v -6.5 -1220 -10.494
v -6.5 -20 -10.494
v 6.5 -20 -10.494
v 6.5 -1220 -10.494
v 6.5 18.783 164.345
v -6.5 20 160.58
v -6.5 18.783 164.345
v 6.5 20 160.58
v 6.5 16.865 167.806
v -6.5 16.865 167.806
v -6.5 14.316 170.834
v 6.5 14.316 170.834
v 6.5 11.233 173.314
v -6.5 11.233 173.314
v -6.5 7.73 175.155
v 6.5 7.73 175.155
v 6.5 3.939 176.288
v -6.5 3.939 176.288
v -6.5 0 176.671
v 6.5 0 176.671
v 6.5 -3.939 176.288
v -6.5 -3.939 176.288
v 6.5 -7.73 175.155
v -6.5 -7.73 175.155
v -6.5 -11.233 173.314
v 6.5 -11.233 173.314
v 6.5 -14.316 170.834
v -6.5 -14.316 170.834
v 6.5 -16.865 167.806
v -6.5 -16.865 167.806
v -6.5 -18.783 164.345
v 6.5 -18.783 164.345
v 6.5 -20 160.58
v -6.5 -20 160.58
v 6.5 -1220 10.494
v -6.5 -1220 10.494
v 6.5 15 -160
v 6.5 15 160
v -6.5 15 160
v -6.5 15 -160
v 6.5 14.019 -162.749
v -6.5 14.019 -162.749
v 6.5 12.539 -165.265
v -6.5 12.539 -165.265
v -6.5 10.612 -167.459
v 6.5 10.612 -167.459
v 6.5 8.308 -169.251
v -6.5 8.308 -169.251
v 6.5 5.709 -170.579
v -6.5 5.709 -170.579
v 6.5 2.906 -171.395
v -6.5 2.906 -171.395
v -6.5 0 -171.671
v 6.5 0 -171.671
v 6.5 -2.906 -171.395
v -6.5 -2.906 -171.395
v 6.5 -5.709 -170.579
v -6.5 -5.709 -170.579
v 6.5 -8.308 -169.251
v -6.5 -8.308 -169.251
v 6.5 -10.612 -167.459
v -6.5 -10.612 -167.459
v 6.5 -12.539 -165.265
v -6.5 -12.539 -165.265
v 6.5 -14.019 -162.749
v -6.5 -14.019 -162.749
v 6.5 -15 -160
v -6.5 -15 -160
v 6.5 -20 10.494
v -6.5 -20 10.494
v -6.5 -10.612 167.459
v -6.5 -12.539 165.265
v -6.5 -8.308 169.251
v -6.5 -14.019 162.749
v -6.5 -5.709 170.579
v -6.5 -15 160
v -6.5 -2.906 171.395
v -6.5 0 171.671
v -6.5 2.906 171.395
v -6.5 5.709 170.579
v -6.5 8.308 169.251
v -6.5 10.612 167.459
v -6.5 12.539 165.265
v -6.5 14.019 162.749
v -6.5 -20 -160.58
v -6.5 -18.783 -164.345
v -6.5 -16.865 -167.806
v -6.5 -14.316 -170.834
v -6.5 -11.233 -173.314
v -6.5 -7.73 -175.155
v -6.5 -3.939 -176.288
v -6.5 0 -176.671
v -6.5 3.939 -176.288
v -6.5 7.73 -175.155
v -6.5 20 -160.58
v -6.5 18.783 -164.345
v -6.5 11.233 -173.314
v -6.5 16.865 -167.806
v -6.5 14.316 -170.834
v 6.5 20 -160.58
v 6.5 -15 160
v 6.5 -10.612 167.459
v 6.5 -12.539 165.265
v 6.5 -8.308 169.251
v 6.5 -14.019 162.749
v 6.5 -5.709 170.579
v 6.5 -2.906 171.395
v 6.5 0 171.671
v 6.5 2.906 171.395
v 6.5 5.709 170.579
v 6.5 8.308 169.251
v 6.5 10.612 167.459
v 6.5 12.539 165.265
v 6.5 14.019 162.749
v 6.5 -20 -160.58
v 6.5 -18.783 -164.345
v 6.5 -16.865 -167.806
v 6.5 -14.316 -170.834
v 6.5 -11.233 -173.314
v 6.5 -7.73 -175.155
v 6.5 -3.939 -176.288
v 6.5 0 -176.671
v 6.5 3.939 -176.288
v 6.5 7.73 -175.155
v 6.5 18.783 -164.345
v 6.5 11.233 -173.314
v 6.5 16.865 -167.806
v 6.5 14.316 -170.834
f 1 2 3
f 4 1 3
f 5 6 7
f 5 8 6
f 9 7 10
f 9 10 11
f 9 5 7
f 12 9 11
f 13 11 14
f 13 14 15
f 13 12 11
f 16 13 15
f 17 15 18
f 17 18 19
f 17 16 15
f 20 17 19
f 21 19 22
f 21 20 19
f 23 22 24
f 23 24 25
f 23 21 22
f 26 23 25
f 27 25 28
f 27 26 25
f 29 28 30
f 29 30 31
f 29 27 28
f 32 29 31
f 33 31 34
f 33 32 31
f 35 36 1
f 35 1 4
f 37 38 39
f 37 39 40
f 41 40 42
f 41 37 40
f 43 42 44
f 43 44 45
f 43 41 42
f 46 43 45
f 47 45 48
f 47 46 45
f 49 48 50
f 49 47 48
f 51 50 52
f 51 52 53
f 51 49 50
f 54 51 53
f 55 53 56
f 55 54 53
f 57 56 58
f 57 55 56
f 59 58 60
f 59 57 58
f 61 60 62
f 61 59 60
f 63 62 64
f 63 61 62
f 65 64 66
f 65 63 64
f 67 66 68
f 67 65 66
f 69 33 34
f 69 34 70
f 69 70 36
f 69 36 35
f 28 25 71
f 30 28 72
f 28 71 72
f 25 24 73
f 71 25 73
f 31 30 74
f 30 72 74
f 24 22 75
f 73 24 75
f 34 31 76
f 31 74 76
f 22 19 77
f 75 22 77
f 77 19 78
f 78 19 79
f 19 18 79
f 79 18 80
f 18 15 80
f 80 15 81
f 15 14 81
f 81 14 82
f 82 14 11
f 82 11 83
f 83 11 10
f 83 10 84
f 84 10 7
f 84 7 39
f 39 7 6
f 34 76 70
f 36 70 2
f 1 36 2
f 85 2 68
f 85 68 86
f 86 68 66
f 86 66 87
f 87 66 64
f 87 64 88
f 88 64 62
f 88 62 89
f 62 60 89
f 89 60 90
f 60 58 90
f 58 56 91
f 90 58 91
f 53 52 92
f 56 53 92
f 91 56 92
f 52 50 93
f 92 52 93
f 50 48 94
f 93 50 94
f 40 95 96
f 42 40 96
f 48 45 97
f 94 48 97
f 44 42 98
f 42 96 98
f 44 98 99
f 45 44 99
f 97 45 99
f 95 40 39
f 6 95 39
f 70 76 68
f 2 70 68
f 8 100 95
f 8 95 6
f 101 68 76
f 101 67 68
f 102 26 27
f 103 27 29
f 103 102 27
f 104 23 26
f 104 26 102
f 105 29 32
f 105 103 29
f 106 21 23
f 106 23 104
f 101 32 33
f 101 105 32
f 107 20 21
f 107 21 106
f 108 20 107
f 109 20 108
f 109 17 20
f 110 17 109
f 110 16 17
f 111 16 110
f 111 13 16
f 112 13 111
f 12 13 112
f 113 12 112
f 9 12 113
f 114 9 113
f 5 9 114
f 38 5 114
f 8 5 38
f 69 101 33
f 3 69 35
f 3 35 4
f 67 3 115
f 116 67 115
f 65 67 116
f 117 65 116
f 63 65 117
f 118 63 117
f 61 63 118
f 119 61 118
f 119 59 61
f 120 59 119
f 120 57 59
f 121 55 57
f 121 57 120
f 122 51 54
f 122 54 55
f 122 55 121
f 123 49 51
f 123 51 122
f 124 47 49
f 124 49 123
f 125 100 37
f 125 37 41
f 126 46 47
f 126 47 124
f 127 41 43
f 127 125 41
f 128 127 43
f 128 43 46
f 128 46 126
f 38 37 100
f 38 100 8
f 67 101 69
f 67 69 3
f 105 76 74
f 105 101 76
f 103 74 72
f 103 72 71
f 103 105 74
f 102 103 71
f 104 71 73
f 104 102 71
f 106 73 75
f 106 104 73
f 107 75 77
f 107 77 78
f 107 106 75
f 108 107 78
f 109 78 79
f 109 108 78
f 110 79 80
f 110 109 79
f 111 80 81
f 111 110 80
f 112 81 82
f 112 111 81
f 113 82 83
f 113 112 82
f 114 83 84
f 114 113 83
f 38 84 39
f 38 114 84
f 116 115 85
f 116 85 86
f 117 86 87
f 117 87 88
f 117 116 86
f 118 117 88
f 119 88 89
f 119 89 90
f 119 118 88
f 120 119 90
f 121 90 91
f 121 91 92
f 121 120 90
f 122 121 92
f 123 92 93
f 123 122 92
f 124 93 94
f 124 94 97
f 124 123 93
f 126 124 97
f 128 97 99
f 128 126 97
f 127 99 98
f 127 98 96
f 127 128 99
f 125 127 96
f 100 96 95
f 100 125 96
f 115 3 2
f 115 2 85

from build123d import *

# Parameters (mm, degrees)
BOSS_EXTRUDE1_DEPTH = 6.5
SKETCH3_W           = 13
SKETCH3_H           = 20.987716218
BOSS_EXTRUDE2_DEPTH = 1200


with BuildPart() as part:
    # Sketch1 → Boss-Extrude1 (new, symmetric)
    with BuildSketch(Plane(origin=(0, 0, 0), x_dir=(0, 0, -1), z_dir=(1, 0, 0))):
        with BuildLine():
            Line((-160.579938889, -20), (160.579938889, -20))
            ThreePointArc((160.579938889, -20), (176.670722942, 0), (160.579938889, 20))
            Line((160.579938889, 20), (-160.579938889, 20))
            ThreePointArc((-160.579938889, 20), (-176.670722942, 0), (-160.579938889, -20))
        make_face()
        with BuildLine():
            Line((-160, 15), (160, 15))
            ThreePointArc((160, 15), (171.670722942, 0), (160, -15))
            Line((160, -15), (-160, -15))
            ThreePointArc((-160, -15), (-171.670722942, 0), (-160, 15))
        make_face(mode=Mode.SUBTRACT)
    extrude(amount=BOSS_EXTRUDE1_DEPTH, both=True)

    # Sketch3 → Boss-Extrude2 (add)
    with BuildSketch(Plane.XZ.offset(20)):
        Rectangle(SKETCH3_W, SKETCH3_H)
    extrude(amount=BOSS_EXTRUDE2_DEPTH)


solid = part.part
